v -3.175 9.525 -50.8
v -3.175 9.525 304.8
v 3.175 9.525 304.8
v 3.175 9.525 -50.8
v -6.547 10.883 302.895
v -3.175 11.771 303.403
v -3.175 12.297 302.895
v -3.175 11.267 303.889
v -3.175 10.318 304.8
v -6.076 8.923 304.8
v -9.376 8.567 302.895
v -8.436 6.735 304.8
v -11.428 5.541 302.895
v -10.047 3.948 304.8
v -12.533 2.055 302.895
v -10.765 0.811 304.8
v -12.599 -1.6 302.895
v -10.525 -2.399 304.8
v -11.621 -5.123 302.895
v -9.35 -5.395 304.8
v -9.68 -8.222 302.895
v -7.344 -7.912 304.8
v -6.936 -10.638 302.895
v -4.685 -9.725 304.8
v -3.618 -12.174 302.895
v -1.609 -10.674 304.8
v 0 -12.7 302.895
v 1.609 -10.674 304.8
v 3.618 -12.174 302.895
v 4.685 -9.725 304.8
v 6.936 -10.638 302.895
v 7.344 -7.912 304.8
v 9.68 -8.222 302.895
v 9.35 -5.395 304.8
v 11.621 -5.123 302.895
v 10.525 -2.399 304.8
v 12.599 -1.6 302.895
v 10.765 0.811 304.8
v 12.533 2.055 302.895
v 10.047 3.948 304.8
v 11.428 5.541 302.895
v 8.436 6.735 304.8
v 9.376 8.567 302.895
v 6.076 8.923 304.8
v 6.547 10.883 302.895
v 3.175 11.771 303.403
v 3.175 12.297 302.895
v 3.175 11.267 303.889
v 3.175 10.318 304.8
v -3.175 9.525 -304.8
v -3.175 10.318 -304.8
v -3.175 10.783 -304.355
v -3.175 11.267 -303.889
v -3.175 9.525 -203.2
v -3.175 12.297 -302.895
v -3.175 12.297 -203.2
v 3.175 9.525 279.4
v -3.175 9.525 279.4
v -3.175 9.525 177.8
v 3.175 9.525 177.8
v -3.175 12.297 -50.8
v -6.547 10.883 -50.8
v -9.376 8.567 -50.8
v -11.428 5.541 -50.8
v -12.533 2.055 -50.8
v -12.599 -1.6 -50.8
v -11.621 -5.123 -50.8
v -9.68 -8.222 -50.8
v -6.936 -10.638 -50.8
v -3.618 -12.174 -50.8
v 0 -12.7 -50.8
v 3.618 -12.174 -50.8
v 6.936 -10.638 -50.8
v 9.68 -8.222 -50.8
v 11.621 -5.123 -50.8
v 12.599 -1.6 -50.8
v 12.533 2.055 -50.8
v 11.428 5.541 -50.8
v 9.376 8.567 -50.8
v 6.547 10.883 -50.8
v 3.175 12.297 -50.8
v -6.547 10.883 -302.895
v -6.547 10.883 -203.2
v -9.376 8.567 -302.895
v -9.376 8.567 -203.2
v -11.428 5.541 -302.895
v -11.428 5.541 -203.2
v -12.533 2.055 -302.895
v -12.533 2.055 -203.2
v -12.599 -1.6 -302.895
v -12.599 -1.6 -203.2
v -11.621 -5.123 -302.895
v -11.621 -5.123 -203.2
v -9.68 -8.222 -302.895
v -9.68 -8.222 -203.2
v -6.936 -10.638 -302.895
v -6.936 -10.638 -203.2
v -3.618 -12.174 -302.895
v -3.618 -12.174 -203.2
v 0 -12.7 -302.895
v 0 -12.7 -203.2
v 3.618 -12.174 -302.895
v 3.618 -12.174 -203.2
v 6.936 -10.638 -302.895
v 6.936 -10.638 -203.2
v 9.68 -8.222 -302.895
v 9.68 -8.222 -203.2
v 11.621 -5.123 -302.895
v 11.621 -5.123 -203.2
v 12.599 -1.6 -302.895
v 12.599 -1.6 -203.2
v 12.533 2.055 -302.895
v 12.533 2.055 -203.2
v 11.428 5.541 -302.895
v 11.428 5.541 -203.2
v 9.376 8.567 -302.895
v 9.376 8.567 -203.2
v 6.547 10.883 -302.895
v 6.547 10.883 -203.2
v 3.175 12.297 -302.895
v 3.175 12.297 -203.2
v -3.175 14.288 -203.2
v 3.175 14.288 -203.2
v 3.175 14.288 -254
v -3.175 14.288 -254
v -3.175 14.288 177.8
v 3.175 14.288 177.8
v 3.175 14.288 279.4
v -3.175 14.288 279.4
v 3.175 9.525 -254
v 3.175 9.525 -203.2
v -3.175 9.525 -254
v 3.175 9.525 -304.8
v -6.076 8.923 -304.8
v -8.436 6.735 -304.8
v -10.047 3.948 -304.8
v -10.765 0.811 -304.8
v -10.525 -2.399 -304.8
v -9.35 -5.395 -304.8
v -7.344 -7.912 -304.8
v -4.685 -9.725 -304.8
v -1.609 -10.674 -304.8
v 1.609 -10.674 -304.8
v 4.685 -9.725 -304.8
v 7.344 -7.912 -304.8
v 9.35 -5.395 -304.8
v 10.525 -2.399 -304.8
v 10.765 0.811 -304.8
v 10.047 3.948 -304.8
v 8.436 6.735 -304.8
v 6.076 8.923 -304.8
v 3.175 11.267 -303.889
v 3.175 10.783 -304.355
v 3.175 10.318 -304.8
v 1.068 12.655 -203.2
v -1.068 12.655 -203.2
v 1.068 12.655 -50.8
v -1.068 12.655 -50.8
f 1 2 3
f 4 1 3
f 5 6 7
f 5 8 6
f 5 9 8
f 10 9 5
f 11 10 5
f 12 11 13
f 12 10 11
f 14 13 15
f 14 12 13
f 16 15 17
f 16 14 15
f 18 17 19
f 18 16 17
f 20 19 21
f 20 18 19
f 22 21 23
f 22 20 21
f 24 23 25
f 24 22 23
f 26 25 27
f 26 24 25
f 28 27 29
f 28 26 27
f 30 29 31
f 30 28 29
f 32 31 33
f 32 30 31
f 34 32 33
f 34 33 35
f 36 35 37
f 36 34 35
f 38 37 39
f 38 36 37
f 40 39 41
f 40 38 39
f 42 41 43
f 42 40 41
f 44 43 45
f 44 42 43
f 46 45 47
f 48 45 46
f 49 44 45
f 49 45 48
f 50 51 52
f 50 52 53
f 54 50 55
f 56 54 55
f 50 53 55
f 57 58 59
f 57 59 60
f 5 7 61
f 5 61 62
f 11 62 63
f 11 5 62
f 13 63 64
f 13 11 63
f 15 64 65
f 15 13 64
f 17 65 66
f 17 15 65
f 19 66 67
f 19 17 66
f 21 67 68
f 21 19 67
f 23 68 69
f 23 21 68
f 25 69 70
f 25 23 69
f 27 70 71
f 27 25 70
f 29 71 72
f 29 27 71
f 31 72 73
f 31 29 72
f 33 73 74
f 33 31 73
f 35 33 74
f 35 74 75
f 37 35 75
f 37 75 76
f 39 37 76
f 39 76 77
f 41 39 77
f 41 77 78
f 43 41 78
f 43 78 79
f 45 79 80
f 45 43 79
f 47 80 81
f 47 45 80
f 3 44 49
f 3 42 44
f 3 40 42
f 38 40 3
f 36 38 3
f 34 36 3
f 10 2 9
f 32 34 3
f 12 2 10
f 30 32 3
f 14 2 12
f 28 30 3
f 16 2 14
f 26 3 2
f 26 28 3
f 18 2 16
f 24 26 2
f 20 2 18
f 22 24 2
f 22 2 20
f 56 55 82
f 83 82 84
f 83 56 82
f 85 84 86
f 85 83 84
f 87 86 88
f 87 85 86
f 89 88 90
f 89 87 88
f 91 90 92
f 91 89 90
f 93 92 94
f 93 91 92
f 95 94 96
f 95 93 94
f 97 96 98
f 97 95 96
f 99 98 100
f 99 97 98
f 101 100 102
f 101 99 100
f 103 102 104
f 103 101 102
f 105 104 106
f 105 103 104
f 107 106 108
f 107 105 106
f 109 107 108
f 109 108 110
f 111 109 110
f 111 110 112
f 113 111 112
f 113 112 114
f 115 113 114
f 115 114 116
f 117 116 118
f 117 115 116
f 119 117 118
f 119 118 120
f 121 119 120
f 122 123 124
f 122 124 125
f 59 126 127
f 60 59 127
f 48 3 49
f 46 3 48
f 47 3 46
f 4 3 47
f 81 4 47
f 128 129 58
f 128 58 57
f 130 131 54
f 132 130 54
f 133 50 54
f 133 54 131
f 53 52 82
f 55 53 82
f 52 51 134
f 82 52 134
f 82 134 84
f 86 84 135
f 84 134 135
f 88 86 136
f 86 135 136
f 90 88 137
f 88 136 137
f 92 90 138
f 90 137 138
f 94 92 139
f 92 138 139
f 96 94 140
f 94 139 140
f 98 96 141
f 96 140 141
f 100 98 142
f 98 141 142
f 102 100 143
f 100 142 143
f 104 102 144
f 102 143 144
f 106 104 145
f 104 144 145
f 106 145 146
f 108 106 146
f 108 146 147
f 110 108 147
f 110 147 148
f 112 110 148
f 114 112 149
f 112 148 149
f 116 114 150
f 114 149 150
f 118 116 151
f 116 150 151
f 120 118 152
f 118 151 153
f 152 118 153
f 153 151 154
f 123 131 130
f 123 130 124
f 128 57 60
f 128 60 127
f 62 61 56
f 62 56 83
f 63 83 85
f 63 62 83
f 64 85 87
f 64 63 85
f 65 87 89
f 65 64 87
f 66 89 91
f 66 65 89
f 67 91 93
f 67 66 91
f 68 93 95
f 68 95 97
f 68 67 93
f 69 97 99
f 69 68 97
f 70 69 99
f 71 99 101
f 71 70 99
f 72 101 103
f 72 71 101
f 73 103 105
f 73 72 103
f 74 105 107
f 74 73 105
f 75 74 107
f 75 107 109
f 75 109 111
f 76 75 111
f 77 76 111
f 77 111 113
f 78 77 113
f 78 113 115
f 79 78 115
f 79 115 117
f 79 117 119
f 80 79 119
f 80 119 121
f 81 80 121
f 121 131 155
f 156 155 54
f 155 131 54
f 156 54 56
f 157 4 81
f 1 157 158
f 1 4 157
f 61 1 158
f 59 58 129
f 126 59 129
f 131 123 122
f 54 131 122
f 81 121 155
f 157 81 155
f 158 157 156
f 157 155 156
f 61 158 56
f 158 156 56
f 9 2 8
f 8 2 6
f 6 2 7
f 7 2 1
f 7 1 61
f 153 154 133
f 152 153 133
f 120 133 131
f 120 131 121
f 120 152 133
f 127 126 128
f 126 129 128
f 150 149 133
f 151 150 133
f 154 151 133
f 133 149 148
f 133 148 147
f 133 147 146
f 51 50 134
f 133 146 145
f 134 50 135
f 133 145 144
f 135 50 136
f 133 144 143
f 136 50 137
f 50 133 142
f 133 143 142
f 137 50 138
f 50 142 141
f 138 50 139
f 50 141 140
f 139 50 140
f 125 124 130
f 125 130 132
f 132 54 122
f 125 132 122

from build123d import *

# Parameters (mm, degrees)
SKETCH1_R           = 12.7
EXTRUDE1_DEPTH      = 304.8
CHAMFER1_SIZE       = 1.905
EXTRUDE2_DEPTH      = 306.328708116
EXTRUDE2_DEPTH_BACK = 306.328708116
SKETCH3_W           = 6.35
SKETCH3_H           = 3.175
EXTRUDE3_START      = -203.2
SKETCH1_2_R         = 12.7
EXTRUDE3_DEPTH      = 152.4
SKETCH5_W           = 6.35
SKETCH5_H           = 4.7625
EXTRUDE4_DEPTH      = 50.8
SKETCH6_W           = 6.35
SKETCH6_H           = 4.7625
EXTRUDE5_DEPTH      = 25.4


with BuildPart() as part:
    # Sketch1 → Extrude1 (new, symmetric)
    with BuildSketch(Plane.XY):
        with Locations(Location((0, 0, 0), (0, 0, 180))):
            Circle(SKETCH1_R)
    extrude(amount=EXTRUDE1_DEPTH, both=True)

    # Chamfer1
    chamfer1_edges = [part.edges().sort_by_distance(p)[0] for p in [
        (12.7, 0, -304.8),
        (12.7, 0, 304.8),
    ]]
    chamfer(chamfer1_edges, length=CHAMFER1_SIZE)

    # Sketch3 → Extrude2 (cut, two sides: drawn at the far end of the back side and taken through both)
    with BuildSketch(Plane.XY.offset(-EXTRUDE2_DEPTH_BACK)):
        with Locations((0, 11.1125)):
            Rectangle(SKETCH3_W, SKETCH3_H)
    extrude(amount=EXTRUDE2_DEPTH + EXTRUDE2_DEPTH_BACK, mode=Mode.SUBTRACT)

    # Sketch1<2> → Extrude3 (add)
    with BuildSketch(Plane.XY.offset(EXTRUDE3_START)):
        with Locations(Location((0, 0, 0), (0, 0, 104.477512186))):
            Circle(SKETCH1_2_R)
    extrude(amount=EXTRUDE3_DEPTH)


with BuildPart() as body_2:
    # Sketch5 → Extrude4 (new, symmetric)
    with BuildSketch(Plane.XY.offset(228.6)):
        with Locations((0, 11.90625)):
            Rectangle(SKETCH5_W, SKETCH5_H)
    extrude(amount=EXTRUDE4_DEPTH, both=True)


with BuildPart() as body_3:
    # Sketch6 → Extrude5 (new, symmetric)
    with BuildSketch(Plane(origin=(0, 0, -228.6), x_dir=(-1, 0, 0), z_dir=(0, 0, -1))):
        with Locations((0, 11.90625)):
            Rectangle(SKETCH6_W, SKETCH6_H)
    extrude(amount=EXTRUDE5_DEPTH, both=True)


solid = Compound([part.part, body_2.part, body_3.part])
